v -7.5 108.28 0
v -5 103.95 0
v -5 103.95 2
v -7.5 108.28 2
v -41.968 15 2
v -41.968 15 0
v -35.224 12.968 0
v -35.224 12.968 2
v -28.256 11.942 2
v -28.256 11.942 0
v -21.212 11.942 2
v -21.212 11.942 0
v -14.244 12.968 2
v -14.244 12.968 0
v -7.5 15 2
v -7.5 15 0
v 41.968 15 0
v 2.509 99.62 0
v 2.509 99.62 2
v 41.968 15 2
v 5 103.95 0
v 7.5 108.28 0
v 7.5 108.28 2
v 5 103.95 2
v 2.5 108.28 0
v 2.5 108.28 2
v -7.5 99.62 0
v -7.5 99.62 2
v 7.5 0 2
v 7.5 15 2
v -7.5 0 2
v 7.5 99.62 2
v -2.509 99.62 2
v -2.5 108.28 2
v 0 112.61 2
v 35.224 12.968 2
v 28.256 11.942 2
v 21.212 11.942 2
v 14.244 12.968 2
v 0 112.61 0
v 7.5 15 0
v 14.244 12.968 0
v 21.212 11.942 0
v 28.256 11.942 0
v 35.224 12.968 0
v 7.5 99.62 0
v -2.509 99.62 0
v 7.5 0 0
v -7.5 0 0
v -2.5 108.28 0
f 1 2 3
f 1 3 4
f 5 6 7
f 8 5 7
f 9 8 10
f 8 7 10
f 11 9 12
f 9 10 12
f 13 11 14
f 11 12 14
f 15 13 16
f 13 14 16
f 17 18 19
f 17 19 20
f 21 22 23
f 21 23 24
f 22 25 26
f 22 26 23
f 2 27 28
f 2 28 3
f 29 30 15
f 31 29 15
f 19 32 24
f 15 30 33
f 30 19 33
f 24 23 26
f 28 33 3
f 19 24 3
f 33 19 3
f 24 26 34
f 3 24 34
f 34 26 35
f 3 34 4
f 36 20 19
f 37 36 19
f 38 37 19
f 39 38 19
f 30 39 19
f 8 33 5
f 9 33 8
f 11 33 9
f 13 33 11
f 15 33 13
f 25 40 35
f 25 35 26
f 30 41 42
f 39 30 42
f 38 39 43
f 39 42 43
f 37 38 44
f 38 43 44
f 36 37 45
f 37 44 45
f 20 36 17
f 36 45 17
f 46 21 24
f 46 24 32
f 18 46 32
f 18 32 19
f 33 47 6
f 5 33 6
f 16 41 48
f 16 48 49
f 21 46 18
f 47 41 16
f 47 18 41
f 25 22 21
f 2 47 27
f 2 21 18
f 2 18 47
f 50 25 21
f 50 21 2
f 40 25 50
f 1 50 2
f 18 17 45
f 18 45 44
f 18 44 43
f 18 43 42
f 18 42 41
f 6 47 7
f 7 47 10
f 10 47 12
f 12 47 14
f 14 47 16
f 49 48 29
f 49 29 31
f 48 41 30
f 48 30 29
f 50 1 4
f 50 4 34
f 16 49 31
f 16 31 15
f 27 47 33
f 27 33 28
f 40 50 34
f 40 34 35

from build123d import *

# Parameters (mm, degrees)
PAD001_DEPTH = 2
PAD_DEPTH    = 2


with BuildPart() as star:
    # Sketch001 → Pad001 (new body)
    with BuildSketch(Plane.XY):
        Polygon((0, 112.610254), (2.5, 108.280127), (7.5, 108.280127), (5, 103.95), (7.5, 99.619873), (2.5, 99.619873), (0, 95.289746), (-2.5, 99.619873), (-7.5, 99.619873), (-5, 103.95), (-7.5, 108.280127), (-2.5, 108.280127), align=None)
    extrude(amount=PAD001_DEPTH)


with BuildPart() as fusion:
    # Sketch → Pad (new body)
    with BuildSketch(Plane.XY):
        with BuildLine():
            Line((7.5, 0), (-7.5, 0))
            Line((-7.5, 0), (-7.5, 15))
            ThreePointArc((-41.967689, 15), (-24.733845, 11.812809), (-7.5, 15))
            Line((0, 105), (-41.967689, 15))
            Line((0, 105), (41.967689, 15))
            ThreePointArc((7.5, 15), (24.733845, 11.812809), (41.967689, 15))
            Line((7.5, 15), (7.5, 0))
        make_face()
    extrude(amount=PAD_DEPTH)

    # Fusion: union Star
    add(star.part)


solid = fusion.part
